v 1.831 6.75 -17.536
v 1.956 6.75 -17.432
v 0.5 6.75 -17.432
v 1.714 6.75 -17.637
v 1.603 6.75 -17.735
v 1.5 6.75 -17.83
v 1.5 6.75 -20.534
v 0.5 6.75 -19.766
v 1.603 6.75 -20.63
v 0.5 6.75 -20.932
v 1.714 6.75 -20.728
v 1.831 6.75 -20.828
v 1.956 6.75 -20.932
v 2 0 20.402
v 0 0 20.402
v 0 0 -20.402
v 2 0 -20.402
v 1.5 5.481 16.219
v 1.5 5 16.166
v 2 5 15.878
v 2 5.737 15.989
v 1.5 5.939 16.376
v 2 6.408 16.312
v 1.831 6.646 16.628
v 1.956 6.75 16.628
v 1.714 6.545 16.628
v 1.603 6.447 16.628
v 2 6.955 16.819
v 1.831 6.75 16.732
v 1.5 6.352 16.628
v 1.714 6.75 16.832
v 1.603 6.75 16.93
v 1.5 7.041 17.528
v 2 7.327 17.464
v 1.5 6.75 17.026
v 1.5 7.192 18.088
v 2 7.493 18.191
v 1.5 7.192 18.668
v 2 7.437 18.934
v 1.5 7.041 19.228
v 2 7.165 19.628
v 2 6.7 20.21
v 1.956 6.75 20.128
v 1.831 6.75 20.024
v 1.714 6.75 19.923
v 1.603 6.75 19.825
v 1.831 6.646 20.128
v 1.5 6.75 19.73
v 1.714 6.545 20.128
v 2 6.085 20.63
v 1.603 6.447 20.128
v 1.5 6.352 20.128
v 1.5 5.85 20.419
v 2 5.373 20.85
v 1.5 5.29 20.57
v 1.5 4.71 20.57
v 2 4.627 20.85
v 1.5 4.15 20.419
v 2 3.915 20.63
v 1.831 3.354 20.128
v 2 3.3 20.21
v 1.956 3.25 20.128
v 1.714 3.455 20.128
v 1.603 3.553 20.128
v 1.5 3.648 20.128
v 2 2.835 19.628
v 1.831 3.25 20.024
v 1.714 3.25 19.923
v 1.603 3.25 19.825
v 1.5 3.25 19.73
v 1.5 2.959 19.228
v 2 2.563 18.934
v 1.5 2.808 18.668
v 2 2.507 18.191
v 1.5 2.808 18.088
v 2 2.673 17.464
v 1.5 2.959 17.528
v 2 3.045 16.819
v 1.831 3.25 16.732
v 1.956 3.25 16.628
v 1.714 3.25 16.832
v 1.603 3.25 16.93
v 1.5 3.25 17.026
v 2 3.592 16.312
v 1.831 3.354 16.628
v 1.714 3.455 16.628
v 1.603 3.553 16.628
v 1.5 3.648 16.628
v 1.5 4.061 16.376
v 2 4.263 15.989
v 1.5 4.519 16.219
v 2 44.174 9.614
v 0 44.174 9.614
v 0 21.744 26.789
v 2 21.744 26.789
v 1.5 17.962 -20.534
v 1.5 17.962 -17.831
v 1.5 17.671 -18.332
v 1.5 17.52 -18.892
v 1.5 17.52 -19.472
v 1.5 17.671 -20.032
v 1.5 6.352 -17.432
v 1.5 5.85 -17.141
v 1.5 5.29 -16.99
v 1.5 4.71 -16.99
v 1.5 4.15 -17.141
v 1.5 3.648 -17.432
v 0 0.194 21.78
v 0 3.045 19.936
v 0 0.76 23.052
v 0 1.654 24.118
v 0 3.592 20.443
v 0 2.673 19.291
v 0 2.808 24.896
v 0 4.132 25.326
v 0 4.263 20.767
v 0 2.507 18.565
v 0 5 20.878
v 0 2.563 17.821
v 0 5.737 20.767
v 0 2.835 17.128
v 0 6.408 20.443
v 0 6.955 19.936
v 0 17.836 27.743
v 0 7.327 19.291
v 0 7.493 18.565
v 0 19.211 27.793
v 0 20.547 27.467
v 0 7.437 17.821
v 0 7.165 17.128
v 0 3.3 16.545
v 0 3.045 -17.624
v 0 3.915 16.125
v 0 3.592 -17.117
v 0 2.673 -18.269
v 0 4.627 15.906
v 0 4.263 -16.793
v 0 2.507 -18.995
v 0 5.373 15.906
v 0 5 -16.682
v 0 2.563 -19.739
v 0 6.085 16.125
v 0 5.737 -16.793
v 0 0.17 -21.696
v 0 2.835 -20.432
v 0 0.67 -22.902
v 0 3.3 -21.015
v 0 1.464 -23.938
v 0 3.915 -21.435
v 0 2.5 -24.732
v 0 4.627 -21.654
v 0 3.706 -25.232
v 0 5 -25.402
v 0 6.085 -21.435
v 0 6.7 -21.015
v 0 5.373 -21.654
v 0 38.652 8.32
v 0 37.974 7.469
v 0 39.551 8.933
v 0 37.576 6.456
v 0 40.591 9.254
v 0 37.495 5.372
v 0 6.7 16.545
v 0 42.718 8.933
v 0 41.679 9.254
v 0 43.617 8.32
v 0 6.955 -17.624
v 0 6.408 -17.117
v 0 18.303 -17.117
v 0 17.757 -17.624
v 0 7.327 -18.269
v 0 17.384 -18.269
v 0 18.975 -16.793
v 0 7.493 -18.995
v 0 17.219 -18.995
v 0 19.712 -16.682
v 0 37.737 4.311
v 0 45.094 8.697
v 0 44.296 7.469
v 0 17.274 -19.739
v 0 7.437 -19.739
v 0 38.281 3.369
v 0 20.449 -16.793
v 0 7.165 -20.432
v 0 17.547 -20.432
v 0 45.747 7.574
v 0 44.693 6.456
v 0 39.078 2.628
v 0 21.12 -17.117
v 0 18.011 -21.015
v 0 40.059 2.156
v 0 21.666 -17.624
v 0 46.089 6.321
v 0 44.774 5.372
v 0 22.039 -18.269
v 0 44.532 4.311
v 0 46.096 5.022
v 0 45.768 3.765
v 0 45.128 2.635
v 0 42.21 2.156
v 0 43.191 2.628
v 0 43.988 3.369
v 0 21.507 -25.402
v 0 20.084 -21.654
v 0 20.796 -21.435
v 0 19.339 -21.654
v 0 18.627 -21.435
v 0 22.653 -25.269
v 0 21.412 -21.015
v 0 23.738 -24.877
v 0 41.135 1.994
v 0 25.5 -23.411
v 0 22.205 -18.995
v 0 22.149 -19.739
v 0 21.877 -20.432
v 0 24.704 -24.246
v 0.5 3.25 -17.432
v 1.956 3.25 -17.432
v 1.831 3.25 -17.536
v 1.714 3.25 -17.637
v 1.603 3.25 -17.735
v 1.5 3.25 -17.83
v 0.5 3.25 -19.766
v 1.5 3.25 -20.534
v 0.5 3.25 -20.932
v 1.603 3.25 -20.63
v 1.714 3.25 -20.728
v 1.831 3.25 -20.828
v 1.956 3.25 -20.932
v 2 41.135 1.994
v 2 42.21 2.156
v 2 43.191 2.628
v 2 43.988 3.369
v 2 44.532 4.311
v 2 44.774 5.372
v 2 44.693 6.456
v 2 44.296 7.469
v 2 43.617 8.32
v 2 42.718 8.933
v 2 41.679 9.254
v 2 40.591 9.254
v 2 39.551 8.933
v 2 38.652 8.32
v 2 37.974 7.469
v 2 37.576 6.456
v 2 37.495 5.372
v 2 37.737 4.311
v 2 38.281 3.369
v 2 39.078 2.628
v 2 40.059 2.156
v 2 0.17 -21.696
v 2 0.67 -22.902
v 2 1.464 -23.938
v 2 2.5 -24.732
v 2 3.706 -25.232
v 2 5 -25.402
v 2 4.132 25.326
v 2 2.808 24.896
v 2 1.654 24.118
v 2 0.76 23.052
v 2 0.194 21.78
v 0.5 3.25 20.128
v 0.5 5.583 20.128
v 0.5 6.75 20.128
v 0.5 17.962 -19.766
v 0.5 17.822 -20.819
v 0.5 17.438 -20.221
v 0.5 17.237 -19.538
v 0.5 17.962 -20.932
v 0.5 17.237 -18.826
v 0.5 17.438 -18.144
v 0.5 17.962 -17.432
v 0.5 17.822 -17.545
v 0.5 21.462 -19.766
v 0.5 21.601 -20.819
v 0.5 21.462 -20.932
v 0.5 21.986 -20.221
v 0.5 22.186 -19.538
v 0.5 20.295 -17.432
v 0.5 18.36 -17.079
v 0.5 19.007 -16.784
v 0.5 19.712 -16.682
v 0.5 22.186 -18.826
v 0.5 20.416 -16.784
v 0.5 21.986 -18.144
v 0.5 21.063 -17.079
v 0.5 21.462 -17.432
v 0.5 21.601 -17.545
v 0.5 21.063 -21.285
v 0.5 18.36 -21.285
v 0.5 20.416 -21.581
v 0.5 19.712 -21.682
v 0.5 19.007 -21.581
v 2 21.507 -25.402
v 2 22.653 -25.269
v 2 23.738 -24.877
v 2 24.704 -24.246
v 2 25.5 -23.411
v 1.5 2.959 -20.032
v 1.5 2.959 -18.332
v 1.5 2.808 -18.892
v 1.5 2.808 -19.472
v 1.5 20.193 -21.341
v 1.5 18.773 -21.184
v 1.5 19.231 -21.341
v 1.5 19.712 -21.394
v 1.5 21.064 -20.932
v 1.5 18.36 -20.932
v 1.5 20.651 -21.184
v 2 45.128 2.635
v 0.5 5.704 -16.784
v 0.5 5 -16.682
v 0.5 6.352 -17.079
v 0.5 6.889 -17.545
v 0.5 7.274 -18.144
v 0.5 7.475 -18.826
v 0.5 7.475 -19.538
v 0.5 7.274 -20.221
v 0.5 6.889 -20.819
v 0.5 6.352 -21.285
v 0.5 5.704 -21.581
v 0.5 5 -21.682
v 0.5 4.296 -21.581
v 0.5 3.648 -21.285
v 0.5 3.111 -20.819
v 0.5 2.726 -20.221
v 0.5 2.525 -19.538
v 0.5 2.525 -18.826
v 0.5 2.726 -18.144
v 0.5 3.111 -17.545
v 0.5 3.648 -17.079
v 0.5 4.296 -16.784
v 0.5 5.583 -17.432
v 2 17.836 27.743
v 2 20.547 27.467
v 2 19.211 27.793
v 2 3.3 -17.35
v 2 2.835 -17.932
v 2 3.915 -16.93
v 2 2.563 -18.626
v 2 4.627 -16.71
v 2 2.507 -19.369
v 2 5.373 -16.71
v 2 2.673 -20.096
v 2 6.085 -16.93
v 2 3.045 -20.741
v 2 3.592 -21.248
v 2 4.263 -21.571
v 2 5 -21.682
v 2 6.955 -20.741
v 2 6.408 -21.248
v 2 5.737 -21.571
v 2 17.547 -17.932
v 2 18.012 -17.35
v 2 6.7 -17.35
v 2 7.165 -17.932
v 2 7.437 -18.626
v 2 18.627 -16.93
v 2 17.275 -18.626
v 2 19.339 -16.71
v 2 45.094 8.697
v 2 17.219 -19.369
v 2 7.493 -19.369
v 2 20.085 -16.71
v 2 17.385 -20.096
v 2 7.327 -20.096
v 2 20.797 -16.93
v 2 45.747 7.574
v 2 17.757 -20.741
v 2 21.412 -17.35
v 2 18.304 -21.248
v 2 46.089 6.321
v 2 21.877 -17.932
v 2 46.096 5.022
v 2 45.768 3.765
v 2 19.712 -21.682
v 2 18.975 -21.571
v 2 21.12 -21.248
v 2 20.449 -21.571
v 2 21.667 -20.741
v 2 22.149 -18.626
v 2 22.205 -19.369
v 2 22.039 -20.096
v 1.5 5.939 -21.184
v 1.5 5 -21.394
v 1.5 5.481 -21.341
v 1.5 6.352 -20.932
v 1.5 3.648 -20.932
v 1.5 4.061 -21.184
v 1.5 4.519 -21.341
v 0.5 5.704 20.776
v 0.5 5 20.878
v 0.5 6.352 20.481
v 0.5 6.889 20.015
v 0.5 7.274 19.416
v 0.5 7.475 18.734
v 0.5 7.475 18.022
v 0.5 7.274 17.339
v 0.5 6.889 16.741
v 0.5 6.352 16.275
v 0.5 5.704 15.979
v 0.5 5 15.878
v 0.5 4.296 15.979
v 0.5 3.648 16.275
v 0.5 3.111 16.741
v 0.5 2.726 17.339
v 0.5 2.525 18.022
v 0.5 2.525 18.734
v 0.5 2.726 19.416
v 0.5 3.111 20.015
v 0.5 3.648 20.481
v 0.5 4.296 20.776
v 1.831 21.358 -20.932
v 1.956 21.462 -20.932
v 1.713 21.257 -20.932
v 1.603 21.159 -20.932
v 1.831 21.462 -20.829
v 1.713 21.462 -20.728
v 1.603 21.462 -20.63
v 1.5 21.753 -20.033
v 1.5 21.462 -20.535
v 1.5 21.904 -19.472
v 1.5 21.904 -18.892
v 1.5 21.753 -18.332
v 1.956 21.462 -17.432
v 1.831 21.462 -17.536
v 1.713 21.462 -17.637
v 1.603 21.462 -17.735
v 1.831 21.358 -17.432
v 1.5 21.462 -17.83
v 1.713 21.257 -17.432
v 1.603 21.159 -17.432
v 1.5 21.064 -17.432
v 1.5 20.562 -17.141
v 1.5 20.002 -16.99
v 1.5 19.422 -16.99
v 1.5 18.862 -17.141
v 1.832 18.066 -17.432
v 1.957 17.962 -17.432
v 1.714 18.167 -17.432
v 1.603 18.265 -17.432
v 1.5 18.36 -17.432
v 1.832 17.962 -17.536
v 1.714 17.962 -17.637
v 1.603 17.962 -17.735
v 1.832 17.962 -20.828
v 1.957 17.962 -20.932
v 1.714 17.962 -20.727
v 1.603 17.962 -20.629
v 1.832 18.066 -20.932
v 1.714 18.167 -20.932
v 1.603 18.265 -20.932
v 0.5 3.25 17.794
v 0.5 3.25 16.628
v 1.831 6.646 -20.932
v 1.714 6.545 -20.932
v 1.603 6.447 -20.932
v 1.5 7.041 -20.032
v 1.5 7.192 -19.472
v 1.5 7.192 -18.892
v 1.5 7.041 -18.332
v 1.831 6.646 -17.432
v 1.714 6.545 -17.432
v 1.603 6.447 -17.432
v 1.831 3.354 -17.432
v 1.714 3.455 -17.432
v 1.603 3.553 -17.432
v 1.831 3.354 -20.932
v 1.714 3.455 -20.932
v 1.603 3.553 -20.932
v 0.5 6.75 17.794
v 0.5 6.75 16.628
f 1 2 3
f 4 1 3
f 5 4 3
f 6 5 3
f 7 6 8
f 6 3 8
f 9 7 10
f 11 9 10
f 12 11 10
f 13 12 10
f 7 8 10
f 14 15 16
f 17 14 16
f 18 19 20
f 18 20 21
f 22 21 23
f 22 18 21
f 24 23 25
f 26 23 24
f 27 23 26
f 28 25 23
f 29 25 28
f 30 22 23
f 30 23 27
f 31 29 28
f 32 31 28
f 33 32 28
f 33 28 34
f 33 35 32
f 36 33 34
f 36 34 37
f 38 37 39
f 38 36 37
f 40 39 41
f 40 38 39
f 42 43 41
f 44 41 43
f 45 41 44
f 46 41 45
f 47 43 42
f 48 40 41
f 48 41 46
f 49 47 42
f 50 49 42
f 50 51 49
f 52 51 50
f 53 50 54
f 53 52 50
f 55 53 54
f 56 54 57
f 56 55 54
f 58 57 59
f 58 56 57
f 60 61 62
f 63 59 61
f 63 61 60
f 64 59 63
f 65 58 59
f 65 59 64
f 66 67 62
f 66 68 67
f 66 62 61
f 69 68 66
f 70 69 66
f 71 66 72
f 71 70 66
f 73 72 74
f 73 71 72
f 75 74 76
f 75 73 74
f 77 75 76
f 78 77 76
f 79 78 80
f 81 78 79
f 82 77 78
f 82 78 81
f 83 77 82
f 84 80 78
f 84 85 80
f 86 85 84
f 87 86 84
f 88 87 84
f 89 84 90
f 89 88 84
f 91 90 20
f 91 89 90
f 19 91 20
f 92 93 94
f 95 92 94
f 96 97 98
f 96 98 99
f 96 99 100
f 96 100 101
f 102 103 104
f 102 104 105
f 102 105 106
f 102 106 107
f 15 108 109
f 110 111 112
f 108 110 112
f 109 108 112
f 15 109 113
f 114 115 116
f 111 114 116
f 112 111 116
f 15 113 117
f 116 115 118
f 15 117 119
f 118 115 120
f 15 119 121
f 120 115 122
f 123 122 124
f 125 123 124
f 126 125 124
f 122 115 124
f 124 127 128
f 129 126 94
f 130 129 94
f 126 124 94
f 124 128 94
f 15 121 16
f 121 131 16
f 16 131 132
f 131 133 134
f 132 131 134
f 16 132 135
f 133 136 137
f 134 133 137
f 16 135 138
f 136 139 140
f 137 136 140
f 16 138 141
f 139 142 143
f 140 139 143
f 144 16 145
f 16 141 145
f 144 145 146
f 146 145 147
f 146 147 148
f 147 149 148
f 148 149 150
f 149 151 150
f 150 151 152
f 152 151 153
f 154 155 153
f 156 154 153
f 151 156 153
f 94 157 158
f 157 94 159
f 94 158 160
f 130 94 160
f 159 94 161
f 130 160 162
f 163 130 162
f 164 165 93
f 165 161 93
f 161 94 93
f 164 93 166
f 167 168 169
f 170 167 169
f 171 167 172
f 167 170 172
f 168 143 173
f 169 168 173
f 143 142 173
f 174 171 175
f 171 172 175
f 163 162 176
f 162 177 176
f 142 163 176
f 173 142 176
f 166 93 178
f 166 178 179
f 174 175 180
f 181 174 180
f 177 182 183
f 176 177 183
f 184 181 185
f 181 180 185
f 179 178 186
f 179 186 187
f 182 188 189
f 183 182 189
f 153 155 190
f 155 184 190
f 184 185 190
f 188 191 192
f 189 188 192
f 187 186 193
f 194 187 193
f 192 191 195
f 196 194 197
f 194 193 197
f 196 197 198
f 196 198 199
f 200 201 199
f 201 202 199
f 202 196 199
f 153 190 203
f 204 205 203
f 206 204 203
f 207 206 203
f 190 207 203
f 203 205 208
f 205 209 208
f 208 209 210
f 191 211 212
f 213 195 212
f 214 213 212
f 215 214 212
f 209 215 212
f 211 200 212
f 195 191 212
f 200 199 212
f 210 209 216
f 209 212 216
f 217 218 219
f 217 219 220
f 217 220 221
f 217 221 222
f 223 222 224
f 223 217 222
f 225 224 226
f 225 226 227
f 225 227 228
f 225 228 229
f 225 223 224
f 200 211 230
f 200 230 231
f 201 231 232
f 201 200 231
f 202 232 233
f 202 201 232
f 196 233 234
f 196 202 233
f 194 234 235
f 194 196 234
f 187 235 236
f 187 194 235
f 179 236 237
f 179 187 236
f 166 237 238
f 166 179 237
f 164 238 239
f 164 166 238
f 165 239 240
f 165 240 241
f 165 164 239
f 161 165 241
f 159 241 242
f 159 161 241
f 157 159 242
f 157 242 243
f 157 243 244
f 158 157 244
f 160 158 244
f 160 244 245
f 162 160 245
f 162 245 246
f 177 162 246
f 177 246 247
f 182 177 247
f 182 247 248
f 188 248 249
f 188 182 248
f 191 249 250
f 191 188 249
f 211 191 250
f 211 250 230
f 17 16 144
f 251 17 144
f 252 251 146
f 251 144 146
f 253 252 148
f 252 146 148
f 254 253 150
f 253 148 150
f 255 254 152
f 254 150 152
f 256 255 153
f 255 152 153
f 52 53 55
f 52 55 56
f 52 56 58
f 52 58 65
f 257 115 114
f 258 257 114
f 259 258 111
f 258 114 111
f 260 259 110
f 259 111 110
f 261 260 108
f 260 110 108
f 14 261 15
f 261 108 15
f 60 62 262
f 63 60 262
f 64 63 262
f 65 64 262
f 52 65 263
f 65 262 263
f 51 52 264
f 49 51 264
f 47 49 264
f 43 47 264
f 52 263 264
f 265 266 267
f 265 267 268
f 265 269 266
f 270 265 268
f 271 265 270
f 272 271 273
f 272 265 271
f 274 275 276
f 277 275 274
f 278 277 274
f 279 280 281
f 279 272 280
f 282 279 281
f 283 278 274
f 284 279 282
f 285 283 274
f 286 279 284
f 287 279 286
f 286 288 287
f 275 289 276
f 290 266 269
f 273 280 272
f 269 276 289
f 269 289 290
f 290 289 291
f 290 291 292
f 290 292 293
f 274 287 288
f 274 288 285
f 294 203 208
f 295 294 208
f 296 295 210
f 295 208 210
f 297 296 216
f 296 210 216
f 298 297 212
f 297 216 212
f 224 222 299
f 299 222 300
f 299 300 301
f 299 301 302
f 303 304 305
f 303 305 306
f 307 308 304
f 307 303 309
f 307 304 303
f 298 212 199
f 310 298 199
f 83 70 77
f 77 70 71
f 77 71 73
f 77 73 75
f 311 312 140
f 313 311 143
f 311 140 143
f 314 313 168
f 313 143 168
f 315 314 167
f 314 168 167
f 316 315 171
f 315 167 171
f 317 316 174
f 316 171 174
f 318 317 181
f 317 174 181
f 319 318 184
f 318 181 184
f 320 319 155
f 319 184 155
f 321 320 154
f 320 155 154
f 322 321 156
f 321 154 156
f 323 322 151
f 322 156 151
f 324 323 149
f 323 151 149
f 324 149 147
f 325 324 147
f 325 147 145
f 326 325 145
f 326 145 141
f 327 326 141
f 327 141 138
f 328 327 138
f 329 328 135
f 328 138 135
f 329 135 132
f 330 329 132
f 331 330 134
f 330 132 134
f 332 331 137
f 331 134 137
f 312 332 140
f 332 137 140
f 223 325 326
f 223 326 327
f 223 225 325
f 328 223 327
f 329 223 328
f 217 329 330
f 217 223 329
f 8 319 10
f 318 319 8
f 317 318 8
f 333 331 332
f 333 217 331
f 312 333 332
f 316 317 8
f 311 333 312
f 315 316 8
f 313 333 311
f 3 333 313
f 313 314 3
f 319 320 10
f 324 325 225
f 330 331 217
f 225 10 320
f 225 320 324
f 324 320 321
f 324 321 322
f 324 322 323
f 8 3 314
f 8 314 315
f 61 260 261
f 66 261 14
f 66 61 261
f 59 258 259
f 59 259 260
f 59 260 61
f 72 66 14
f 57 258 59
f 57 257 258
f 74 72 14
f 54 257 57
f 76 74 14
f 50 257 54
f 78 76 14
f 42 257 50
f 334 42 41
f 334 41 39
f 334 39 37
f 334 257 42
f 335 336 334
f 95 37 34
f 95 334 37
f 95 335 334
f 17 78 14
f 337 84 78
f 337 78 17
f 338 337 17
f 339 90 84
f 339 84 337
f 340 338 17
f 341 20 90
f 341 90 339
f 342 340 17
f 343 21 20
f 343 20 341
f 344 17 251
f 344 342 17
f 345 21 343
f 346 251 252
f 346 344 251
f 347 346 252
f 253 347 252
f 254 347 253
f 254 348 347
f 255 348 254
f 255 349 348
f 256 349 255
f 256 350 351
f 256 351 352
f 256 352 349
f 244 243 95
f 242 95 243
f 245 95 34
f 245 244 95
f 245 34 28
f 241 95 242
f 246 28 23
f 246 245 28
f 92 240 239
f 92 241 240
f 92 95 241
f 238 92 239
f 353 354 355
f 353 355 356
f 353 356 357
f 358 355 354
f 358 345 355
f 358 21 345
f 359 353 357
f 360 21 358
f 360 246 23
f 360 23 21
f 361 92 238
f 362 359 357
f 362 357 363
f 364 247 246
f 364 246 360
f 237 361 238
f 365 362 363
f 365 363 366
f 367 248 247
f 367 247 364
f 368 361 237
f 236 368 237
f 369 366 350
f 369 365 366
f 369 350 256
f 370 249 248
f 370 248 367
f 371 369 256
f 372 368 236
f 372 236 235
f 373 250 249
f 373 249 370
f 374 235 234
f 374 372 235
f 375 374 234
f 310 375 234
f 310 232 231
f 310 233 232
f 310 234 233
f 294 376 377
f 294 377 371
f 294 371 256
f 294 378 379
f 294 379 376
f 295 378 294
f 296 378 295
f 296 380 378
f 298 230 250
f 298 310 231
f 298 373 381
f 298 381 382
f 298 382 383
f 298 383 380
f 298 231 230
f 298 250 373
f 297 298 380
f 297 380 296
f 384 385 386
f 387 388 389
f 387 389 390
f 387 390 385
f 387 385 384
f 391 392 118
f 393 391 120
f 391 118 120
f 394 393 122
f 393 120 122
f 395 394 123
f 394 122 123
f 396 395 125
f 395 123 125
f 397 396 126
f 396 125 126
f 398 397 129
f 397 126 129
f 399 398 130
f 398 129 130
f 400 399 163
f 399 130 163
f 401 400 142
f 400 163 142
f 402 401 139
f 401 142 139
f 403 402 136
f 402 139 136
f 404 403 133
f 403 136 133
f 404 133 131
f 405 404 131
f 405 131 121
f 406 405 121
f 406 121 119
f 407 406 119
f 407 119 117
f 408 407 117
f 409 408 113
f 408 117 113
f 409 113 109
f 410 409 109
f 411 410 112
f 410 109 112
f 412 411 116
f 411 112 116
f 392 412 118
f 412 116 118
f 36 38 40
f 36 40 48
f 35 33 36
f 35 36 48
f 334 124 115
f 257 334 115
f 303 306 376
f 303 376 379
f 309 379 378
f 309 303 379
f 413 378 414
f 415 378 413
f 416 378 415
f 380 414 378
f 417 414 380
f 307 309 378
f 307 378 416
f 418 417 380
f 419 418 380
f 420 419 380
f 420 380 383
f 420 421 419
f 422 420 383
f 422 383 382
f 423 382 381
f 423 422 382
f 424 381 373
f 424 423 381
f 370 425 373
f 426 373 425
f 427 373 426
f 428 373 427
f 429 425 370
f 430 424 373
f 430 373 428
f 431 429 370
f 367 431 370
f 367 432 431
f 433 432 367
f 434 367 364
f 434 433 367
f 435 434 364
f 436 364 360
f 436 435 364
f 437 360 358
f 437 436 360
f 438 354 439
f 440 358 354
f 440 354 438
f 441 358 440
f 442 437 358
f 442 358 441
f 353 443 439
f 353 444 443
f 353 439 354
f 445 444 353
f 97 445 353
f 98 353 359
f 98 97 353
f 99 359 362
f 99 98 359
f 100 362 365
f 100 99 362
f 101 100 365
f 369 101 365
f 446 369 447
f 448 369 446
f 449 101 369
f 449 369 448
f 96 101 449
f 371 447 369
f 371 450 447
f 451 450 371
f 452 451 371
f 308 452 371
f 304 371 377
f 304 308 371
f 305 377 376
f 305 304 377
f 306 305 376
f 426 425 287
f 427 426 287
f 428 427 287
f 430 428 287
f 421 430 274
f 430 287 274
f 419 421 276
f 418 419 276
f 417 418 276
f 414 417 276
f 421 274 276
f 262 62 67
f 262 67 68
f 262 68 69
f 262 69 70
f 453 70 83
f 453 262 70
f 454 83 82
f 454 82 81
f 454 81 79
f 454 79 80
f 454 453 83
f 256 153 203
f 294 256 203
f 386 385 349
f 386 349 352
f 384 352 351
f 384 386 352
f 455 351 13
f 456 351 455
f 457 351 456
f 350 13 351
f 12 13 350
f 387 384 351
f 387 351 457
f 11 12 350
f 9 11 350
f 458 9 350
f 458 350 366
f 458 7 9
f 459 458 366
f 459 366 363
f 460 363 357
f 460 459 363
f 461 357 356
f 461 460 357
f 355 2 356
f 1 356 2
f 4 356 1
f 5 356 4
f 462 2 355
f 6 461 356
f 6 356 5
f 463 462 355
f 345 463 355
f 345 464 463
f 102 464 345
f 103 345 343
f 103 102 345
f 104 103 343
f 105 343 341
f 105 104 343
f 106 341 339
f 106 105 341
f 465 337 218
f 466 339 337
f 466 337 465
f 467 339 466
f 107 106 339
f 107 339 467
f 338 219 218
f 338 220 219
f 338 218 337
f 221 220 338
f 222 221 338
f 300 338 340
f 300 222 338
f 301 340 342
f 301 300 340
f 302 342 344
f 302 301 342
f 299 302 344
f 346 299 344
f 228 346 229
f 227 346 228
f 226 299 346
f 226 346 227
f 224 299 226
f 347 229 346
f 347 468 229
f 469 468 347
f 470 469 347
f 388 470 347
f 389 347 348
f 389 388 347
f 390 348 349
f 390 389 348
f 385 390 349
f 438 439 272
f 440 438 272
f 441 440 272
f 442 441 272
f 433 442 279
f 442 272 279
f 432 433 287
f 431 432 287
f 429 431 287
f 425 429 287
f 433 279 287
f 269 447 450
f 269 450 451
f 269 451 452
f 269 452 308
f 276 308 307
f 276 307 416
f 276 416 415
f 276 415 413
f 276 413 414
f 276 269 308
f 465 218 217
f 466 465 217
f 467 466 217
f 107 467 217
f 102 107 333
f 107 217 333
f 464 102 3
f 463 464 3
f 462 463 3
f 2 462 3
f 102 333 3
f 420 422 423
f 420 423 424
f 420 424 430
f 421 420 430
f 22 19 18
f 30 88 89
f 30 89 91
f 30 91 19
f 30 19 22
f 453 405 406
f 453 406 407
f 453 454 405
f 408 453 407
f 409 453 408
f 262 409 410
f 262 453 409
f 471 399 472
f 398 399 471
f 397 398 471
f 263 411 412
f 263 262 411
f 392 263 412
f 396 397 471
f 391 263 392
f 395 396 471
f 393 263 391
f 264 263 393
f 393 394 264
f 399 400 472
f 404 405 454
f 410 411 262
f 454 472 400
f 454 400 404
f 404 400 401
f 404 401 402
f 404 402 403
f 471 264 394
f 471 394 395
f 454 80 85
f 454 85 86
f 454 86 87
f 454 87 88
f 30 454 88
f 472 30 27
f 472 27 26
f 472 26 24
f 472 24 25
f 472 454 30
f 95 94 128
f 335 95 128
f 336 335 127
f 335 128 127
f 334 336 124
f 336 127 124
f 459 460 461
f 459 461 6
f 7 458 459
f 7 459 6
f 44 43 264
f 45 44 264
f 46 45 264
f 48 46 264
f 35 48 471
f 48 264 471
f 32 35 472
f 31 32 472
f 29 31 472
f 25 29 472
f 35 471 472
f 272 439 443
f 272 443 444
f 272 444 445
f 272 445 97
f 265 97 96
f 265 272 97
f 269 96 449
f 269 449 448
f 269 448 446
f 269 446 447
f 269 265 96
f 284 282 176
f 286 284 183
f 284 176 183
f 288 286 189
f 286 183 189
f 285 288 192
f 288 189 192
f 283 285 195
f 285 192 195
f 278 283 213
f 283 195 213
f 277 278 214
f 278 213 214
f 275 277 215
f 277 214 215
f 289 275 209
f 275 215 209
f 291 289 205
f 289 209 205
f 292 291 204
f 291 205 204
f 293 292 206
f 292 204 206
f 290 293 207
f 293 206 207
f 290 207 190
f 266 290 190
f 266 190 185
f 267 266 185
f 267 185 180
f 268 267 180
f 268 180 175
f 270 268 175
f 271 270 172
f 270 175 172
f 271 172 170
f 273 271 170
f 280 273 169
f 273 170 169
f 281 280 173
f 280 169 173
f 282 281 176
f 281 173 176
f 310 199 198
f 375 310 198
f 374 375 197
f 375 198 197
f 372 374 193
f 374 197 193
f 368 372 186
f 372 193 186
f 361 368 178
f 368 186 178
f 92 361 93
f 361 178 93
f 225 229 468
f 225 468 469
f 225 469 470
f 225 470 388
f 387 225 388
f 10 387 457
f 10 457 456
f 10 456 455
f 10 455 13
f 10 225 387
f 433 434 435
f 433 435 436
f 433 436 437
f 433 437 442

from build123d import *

# Parameters (mm, degrees)
SKETCH1_R           = 3.65
SKETCH1_W           = 3.5
SKETCH1_H           = 3.5
BOSS_EXTRUDE1_DEPTH = 2
SKETCH3_R           = 2.5
CUT_EXTRUDE1_DEPTH  = 0.5
CUT_EXTRUDE1_TAPER  = 30
SKETCH5_R           = 2.5
CUT_EXTRUDE2_DEPTH  = 0.5


with BuildPart() as part:
    # Sketch1 → Boss-Extrude1 (new body)
    with BuildSketch(Plane(origin=(0, 0, 0), x_dir=(0, 0, -1), z_dir=(1, 0, 0))):
        with BuildLine():
            Line((-20.402250922, 0), (20.402250922, 0))
            ThreePointArc((20.402250922, 0), (23.937784828, 1.464466094), (25.402250922, 5))
            Line((25.402250922, 5), (25.402250922, 21.50709196))
            ThreePointArc((25.402250922, 21.50709196), (24.87692273, 23.738081025), (23.411326038, 25.50026951))
            Line((23.411326038, 25.50026951), (-2.635195634, 45.127731407))
            ThreePointArc((-2.635195634, 45.127731407), (-6.321071977, 46.088536103), (-9.61416456, 44.174281334))
            Line((-9.61416456, 44.174281334), (-26.788641191, 21.74435991))
            ThreePointArc((-26.788641191, 21.74435991), (-27.676067974, 19.890565251), (-27.742786146, 17.836391544))
            Line((-27.742786146, 17.836391544), (-25.326289687, 4.131759112))
            ThreePointArc((-25.326289687, 4.131759112), (-23.61618897, 1.169777784), (-20.402250922, 0))
        make_face()
        with Locations((-5.64427075, 41.134553857)):
            Circle(SKETCH1_R, mode=Mode.SUBTRACT)
        with Locations((-18.377749078, 5)):
            Rectangle(SKETCH1_W, SKETCH1_H, mode=Mode.SUBTRACT)
        with Locations((19.182250922, 5)):
            Rectangle(SKETCH1_W, SKETCH1_H, mode=Mode.SUBTRACT)
        with Locations((19.182250922, 19.71162529)):
            Rectangle(SKETCH1_W, SKETCH1_H, mode=Mode.SUBTRACT)
    extrude(amount=BOSS_EXTRUDE1_DEPTH)

    # Sketch3 → Cut-Extrude1 (cut)
    with BuildSketch(Plane(origin=(2, 0, 0), x_dir=(0, 0, -1), z_dir=(1, 0, 0))):
        with Locations((-18.377749078, 5)):
            Circle(SKETCH3_R)
        with Locations((19.182250922, 5)):
            Circle(SKETCH3_R)
        with Locations((19.182250922, 19.712)):
            Circle(SKETCH3_R)
    extrude(amount=-CUT_EXTRUDE1_DEPTH, taper=CUT_EXTRUDE1_TAPER, mode=Mode.SUBTRACT)

    # Sketch5 → Cut-Extrude2 (cut)
    with BuildSketch(Plane.ZY):
        with Locations((-19.182250922, 5)):
            Circle(SKETCH5_R)
        with Locations((-19.182250922, 19.71162529)):
            Circle(SKETCH5_R)
        with Locations((18.377749078, 5)):
            Circle(SKETCH5_R)
    extrude(amount=-CUT_EXTRUDE2_DEPTH, mode=Mode.SUBTRACT)


solid = part.part
